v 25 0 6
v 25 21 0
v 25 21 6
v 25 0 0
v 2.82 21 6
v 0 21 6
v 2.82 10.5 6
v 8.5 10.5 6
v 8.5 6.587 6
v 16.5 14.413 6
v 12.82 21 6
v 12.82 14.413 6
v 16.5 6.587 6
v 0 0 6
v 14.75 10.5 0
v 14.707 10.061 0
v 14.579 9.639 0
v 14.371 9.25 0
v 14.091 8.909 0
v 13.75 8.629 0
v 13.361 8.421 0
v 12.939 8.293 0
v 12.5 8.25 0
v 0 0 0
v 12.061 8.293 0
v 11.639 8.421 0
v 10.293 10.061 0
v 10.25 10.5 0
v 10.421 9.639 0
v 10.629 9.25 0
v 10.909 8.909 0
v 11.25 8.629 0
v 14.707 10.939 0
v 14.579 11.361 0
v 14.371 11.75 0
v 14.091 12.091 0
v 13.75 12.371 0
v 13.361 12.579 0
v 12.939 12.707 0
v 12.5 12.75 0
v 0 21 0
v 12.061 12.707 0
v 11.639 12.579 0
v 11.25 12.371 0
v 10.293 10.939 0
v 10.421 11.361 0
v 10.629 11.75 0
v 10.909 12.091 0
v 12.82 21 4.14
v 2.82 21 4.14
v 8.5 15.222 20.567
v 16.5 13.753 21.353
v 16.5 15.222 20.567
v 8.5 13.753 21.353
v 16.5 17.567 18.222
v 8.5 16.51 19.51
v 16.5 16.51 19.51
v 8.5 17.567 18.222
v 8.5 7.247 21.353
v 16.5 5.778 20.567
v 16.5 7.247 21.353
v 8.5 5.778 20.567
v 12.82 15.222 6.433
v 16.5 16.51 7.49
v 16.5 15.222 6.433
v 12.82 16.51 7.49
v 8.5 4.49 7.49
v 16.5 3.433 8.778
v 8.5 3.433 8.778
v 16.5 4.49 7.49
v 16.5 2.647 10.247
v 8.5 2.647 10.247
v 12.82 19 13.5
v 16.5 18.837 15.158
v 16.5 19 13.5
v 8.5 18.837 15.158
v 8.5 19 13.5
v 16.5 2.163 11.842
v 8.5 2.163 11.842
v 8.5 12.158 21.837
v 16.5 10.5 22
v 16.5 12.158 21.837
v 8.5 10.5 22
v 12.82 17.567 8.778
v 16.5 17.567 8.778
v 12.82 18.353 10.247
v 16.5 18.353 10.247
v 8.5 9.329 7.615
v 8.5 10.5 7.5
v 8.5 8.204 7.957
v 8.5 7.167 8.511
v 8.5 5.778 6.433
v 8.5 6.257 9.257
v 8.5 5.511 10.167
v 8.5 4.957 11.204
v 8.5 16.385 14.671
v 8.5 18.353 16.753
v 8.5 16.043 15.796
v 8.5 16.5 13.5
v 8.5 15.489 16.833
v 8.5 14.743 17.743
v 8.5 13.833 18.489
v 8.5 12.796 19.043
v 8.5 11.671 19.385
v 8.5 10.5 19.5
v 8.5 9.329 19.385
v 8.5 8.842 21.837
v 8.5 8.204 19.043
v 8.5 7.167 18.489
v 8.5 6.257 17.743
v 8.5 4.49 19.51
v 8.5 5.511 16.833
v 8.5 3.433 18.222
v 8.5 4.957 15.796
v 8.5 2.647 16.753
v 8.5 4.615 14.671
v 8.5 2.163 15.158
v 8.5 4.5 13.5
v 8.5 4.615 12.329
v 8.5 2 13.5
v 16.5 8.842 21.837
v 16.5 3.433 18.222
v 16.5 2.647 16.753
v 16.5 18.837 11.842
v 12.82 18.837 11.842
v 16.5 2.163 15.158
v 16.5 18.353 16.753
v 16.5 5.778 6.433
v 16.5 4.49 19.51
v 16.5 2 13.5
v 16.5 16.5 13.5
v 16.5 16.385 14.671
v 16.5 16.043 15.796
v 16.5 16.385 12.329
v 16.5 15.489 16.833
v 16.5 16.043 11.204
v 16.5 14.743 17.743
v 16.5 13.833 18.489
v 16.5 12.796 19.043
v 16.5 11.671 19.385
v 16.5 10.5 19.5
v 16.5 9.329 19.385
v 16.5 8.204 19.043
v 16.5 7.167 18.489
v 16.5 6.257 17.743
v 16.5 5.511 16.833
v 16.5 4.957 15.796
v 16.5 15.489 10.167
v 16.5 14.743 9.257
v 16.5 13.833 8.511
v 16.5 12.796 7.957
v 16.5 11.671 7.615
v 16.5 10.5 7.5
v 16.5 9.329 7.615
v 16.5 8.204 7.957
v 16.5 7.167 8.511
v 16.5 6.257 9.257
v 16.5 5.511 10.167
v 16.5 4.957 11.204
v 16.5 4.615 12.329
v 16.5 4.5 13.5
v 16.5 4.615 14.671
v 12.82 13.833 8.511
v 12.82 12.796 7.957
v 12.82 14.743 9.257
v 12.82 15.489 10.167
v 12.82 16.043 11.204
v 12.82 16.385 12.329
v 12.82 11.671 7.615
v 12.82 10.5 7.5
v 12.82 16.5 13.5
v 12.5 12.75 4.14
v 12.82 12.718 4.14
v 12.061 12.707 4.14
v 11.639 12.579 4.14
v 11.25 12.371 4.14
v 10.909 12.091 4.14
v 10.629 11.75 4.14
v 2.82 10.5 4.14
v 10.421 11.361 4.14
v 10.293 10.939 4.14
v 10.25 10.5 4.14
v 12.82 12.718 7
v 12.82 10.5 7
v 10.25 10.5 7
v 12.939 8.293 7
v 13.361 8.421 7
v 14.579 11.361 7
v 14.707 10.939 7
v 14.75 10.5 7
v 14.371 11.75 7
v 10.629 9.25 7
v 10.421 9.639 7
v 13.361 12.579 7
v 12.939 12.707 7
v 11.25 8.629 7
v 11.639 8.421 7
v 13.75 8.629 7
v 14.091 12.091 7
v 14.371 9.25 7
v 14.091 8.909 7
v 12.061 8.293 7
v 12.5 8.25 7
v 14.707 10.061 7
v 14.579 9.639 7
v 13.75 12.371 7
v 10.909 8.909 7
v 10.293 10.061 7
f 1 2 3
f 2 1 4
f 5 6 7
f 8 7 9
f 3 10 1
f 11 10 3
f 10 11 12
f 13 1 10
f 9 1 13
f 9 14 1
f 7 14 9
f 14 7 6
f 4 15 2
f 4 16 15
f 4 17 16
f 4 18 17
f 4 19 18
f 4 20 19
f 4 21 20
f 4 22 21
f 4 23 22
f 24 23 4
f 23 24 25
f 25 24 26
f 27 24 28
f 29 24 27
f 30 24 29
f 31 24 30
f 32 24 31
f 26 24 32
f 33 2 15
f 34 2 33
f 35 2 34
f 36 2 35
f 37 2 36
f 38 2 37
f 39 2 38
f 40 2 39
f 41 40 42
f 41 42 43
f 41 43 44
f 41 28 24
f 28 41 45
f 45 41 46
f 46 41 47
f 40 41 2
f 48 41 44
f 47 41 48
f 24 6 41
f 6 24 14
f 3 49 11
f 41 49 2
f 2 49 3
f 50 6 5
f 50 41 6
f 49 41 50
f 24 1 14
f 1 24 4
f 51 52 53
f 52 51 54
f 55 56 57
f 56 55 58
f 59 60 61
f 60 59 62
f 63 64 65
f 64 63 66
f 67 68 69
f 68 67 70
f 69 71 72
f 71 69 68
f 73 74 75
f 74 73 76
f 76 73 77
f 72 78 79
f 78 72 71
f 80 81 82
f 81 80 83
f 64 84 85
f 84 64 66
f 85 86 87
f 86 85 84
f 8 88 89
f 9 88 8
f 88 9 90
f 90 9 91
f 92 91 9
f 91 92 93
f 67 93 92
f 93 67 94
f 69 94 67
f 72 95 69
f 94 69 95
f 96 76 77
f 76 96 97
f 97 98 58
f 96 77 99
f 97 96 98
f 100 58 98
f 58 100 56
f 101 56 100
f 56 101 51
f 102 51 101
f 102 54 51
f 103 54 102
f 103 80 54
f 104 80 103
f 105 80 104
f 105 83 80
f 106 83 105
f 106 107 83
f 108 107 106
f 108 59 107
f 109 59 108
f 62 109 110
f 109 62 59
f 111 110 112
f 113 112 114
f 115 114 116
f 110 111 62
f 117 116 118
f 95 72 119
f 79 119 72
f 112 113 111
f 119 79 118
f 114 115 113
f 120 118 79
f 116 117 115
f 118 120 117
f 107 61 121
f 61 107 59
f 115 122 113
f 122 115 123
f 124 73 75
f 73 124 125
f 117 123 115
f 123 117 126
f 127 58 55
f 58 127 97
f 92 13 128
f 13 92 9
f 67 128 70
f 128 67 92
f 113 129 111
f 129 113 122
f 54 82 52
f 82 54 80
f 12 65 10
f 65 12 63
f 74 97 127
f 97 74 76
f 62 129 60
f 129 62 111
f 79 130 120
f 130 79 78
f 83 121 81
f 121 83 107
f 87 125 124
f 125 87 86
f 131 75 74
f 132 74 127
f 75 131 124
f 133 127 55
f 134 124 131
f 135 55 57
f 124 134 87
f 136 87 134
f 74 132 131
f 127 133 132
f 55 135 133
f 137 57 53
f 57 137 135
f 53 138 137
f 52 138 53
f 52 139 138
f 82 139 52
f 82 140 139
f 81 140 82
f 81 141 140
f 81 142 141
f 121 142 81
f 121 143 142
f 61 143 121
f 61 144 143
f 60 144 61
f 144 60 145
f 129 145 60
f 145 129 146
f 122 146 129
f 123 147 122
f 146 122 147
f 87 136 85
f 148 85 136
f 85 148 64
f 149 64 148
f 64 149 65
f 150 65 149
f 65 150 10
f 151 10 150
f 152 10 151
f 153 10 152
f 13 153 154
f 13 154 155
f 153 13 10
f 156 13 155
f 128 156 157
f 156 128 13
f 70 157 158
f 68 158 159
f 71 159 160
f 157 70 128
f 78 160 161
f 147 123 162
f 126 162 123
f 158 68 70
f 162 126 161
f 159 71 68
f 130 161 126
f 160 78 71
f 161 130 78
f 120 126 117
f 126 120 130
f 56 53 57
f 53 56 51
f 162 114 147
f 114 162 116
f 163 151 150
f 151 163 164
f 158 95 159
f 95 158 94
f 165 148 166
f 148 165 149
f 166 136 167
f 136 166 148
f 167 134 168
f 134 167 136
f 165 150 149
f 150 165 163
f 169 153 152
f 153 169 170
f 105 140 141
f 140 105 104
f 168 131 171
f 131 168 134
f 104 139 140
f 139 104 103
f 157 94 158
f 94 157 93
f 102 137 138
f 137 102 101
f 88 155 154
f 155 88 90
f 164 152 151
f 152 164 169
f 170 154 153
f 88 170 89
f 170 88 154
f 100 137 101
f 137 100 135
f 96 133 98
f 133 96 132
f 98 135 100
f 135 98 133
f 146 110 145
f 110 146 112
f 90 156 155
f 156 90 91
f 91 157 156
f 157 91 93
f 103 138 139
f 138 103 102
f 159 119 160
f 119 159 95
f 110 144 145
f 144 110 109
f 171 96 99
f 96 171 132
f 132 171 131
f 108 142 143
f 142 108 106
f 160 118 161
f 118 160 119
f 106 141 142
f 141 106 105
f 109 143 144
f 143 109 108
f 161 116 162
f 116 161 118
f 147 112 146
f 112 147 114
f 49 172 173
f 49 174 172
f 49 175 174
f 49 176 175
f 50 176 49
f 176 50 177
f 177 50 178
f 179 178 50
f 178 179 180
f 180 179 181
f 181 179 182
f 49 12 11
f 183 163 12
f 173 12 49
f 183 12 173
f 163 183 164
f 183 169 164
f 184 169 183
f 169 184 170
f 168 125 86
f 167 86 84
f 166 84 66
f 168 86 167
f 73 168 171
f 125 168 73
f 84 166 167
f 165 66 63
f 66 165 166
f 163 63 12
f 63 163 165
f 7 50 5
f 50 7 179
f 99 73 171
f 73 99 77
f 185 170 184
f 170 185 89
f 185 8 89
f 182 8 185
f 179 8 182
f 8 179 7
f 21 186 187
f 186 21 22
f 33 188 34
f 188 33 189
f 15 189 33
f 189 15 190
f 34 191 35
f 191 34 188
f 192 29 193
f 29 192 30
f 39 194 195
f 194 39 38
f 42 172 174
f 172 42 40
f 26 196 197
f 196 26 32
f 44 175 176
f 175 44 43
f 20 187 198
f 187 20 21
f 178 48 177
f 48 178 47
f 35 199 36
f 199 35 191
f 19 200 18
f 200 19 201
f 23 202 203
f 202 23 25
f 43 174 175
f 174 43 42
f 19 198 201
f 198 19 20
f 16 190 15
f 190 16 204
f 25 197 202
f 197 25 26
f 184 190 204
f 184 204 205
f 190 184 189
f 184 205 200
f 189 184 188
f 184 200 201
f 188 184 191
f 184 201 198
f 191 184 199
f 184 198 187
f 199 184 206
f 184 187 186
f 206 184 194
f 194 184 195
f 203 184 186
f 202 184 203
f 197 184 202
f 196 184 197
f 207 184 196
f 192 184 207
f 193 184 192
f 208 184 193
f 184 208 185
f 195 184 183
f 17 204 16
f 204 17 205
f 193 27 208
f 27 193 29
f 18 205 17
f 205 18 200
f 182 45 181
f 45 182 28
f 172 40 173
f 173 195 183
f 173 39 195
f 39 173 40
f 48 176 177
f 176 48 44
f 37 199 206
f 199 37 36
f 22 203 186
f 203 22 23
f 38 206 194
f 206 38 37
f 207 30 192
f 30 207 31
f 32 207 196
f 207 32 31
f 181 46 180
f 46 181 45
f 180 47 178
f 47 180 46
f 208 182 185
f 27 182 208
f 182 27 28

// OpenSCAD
$fn = 32;

// ----------------------------------------------------------------------
// Cable clip: cable 12 mm, clamp 17 mm, base 25 mm
// ----------------------------------------------------------------------

// --- parameters (mm) ---
base_w = 25;              // base length, X
base_d = 21;              // base width, Y
base_t = 6;               // base thickness
clamp_d = 17;             // clamp outside diameter
wall_t = 2.5;             // clamp wall
cable_d = 12;             // cable opening
ring_w = 8;               // clamp width along the cable
screw_d = 4.5;            // screw clearance
throat = 9.36;            // snap throat width
sink = 1;                 // overlap of the clamp into the base

module base() {
  cube([base_w, base_d, base_t]);
}

module clamp() {
  translate([base_w / 2, base_d / 2, base_t + clamp_d / 2 - sink]) rotate([0, 90, 0])
    cylinder(h = ring_w, d = clamp_d, center = true);
}

difference() {
  union() {
    base();
    clamp();
  }
  translate([base_w / 2, base_d / 2, base_t + clamp_d / 2 - sink]) rotate([0, 90, 0]) translate([0, 0, -ring_w / 2 - 1]) cylinder(h = ring_w + 2, d = cable_d);
  /* snap throat: the opening is narrower than the cable */
  translate([base_w / 2 - throat / 2, base_d / 2, base_t + clamp_d / 2 - sink]) rotate([0, 90, 0]) translate([0, 0, -ring_w / 2 - 1]) cube([throat, clamp_d + 2, ring_w + 2]);
  translate([12.5, base_d / 2, -1]) cylinder(h = base_t + 2, d = screw_d);
}
